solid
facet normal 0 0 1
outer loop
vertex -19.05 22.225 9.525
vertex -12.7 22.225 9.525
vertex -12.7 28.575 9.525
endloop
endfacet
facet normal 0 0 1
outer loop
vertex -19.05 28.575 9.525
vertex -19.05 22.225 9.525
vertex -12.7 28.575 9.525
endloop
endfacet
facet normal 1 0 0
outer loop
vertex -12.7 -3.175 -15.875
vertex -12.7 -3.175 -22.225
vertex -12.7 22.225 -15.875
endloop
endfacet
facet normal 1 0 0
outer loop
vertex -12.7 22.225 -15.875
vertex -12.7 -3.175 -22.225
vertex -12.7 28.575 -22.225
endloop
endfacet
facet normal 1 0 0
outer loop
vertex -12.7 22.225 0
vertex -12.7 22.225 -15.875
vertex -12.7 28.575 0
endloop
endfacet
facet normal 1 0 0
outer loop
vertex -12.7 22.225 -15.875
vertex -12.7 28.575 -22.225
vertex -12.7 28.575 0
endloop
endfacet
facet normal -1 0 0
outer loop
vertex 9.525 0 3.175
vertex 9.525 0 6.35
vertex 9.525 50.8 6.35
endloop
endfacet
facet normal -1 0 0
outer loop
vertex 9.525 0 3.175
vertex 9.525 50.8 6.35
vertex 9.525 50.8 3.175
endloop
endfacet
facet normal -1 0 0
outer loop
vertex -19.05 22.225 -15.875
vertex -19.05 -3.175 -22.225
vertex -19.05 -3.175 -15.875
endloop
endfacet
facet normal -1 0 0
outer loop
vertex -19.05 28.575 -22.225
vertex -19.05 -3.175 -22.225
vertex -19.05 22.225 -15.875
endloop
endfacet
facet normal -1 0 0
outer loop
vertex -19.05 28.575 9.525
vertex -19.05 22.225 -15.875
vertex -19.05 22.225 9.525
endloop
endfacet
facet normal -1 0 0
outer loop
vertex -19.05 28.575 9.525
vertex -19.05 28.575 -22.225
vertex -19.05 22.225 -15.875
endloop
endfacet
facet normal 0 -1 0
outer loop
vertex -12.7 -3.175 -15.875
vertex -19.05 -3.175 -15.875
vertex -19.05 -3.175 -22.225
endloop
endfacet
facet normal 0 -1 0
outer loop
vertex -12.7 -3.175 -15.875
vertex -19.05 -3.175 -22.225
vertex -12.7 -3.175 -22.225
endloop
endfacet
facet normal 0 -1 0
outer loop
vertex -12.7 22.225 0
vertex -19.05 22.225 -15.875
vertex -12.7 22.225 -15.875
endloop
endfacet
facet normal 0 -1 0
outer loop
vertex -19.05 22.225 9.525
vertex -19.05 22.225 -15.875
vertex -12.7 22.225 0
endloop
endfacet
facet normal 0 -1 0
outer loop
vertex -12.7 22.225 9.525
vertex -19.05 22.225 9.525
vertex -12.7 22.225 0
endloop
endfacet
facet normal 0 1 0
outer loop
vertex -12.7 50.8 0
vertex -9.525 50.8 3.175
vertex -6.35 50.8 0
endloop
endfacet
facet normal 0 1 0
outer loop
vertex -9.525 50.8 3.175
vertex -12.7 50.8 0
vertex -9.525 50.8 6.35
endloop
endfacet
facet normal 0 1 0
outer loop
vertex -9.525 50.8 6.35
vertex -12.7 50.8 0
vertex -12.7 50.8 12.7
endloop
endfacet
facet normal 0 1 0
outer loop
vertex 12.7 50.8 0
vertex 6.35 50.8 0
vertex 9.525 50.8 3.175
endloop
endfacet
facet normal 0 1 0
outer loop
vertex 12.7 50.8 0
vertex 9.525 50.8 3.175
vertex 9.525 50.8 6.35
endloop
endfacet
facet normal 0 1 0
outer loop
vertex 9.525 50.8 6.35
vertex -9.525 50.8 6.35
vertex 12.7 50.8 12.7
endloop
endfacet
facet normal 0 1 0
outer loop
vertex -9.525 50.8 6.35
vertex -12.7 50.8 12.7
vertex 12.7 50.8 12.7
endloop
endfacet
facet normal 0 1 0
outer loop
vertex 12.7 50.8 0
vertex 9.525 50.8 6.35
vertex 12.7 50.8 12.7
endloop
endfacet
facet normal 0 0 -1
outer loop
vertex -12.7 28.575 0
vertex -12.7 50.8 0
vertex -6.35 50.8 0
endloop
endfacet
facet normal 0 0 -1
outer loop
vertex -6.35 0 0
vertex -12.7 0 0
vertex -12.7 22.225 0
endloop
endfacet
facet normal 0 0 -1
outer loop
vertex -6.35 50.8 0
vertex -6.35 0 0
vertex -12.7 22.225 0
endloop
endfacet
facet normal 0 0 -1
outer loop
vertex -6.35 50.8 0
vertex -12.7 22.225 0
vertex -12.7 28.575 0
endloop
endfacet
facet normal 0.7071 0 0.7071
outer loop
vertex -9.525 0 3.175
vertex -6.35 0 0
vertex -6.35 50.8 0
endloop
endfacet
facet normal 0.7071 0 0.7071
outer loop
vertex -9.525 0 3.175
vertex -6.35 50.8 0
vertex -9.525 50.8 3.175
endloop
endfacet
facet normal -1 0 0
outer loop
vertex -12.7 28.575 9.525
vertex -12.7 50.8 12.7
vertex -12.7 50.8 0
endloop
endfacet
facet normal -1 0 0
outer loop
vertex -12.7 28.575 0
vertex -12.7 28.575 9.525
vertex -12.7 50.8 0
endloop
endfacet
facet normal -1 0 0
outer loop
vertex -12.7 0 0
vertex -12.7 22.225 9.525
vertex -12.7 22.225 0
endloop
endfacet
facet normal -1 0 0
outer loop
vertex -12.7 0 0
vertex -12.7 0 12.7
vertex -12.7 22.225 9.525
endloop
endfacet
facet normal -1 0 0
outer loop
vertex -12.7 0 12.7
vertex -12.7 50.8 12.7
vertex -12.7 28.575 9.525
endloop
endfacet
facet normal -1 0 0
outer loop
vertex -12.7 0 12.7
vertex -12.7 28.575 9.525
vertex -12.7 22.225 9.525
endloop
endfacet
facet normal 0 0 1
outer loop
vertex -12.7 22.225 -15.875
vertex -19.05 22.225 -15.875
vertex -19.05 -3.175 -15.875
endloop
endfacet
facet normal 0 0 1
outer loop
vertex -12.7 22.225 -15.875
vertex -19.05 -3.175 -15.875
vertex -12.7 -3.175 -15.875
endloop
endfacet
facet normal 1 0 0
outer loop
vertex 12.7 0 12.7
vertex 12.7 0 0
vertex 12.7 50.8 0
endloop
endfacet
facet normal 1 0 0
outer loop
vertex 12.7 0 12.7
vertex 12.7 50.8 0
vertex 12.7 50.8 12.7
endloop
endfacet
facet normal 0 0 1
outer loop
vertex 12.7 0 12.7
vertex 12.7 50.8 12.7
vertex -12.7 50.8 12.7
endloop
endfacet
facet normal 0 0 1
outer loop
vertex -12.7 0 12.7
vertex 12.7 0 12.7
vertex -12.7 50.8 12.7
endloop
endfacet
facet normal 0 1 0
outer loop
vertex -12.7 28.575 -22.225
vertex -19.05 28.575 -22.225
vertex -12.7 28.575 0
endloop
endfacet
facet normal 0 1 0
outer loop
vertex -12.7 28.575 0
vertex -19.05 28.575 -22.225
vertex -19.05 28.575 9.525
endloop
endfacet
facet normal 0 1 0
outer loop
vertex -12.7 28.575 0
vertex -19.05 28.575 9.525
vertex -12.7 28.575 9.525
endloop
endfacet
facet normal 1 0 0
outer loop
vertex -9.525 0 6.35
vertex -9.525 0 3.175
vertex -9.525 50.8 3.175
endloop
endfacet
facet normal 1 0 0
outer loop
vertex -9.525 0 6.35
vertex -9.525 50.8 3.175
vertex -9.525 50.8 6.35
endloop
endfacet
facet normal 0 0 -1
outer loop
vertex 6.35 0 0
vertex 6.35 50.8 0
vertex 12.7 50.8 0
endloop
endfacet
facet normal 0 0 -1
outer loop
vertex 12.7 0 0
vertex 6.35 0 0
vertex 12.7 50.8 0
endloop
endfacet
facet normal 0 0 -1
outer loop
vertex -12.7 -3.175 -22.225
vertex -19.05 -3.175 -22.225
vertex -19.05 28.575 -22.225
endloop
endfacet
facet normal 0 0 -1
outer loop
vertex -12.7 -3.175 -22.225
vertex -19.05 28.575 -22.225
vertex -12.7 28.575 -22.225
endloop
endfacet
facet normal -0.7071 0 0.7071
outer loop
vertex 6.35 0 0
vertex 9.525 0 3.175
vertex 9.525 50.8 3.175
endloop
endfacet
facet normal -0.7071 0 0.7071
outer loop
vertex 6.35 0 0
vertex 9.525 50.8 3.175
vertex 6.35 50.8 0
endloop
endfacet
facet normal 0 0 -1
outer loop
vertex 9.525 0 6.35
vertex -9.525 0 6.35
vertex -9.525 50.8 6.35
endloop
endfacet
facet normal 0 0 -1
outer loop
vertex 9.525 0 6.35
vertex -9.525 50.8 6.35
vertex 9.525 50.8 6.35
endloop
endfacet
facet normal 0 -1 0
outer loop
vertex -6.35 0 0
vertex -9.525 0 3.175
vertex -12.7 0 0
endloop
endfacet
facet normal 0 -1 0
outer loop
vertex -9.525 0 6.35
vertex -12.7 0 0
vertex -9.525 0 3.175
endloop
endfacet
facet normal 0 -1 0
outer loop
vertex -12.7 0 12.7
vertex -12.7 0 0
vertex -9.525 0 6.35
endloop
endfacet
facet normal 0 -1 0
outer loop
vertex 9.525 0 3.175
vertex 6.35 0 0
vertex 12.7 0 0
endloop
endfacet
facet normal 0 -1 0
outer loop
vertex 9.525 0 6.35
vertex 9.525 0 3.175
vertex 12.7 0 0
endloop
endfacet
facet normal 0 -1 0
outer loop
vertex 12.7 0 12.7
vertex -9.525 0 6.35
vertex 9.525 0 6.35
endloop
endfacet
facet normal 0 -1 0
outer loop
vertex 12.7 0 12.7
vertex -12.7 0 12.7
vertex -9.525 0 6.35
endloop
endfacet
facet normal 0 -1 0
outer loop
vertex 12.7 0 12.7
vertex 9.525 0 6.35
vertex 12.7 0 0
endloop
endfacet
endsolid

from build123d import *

# Parameters (mm, degrees)
F1_DEPTH  = 50.8
F3_DEPTH  = 6.35
F3_FACE_W = 6.35
F3_FACE_H = 6.35
F4_DEPTH  = 25.4
F5_W      = 6.35
F5_H      = 6.35
F6_DEPTH  = 25.4


with BuildPart() as f1:
    # F0 (on Front) → F1 (new body)
    with BuildSketch(Plane.XZ):
        Polygon((-12.7, 0), (-6.35, 0), (-9.525, 3.175), (-9.525, 6.35), (0, 6.35), (9.525, 6.35), (9.525, 3.175), (6.35, 0), (12.7, 0), (12.7, 12.7), (0, 12.7), (-12.7, 12.7), align=None)
    extrude(amount=-F1_DEPTH)

    # F2 (on face) → F3 (join)
    with BuildSketch(Plane(origin=(-12.7, 0, 0), x_dir=(0, -1, 0), z_dir=(-1, 0, 0))):
        Polygon((-22.225, 9.525), (-25.4, 9.525), (-28.575, 9.525), (-28.575, 3.175), (-22.225, 3.175), align=None)
    extrude(amount=F3_DEPTH)

    # F3_face (on face) → F4 (join)
    with BuildSketch(Plane(origin=(-15.875, 25.4, 3.175), x_dir=(1, 0, 0), z_dir=(0, 0, -1))):
        Rectangle(F3_FACE_W, F3_FACE_H)
    extrude(amount=F4_DEPTH)

    # F5 (on face) → F6 (join)
    with BuildSketch(Plane.XZ.offset(-22.225)):
        with Locations((-15.875, -19.05)):
            Rectangle(F5_W, F5_H)
    extrude(amount=F6_DEPTH)


solid = f1.part
